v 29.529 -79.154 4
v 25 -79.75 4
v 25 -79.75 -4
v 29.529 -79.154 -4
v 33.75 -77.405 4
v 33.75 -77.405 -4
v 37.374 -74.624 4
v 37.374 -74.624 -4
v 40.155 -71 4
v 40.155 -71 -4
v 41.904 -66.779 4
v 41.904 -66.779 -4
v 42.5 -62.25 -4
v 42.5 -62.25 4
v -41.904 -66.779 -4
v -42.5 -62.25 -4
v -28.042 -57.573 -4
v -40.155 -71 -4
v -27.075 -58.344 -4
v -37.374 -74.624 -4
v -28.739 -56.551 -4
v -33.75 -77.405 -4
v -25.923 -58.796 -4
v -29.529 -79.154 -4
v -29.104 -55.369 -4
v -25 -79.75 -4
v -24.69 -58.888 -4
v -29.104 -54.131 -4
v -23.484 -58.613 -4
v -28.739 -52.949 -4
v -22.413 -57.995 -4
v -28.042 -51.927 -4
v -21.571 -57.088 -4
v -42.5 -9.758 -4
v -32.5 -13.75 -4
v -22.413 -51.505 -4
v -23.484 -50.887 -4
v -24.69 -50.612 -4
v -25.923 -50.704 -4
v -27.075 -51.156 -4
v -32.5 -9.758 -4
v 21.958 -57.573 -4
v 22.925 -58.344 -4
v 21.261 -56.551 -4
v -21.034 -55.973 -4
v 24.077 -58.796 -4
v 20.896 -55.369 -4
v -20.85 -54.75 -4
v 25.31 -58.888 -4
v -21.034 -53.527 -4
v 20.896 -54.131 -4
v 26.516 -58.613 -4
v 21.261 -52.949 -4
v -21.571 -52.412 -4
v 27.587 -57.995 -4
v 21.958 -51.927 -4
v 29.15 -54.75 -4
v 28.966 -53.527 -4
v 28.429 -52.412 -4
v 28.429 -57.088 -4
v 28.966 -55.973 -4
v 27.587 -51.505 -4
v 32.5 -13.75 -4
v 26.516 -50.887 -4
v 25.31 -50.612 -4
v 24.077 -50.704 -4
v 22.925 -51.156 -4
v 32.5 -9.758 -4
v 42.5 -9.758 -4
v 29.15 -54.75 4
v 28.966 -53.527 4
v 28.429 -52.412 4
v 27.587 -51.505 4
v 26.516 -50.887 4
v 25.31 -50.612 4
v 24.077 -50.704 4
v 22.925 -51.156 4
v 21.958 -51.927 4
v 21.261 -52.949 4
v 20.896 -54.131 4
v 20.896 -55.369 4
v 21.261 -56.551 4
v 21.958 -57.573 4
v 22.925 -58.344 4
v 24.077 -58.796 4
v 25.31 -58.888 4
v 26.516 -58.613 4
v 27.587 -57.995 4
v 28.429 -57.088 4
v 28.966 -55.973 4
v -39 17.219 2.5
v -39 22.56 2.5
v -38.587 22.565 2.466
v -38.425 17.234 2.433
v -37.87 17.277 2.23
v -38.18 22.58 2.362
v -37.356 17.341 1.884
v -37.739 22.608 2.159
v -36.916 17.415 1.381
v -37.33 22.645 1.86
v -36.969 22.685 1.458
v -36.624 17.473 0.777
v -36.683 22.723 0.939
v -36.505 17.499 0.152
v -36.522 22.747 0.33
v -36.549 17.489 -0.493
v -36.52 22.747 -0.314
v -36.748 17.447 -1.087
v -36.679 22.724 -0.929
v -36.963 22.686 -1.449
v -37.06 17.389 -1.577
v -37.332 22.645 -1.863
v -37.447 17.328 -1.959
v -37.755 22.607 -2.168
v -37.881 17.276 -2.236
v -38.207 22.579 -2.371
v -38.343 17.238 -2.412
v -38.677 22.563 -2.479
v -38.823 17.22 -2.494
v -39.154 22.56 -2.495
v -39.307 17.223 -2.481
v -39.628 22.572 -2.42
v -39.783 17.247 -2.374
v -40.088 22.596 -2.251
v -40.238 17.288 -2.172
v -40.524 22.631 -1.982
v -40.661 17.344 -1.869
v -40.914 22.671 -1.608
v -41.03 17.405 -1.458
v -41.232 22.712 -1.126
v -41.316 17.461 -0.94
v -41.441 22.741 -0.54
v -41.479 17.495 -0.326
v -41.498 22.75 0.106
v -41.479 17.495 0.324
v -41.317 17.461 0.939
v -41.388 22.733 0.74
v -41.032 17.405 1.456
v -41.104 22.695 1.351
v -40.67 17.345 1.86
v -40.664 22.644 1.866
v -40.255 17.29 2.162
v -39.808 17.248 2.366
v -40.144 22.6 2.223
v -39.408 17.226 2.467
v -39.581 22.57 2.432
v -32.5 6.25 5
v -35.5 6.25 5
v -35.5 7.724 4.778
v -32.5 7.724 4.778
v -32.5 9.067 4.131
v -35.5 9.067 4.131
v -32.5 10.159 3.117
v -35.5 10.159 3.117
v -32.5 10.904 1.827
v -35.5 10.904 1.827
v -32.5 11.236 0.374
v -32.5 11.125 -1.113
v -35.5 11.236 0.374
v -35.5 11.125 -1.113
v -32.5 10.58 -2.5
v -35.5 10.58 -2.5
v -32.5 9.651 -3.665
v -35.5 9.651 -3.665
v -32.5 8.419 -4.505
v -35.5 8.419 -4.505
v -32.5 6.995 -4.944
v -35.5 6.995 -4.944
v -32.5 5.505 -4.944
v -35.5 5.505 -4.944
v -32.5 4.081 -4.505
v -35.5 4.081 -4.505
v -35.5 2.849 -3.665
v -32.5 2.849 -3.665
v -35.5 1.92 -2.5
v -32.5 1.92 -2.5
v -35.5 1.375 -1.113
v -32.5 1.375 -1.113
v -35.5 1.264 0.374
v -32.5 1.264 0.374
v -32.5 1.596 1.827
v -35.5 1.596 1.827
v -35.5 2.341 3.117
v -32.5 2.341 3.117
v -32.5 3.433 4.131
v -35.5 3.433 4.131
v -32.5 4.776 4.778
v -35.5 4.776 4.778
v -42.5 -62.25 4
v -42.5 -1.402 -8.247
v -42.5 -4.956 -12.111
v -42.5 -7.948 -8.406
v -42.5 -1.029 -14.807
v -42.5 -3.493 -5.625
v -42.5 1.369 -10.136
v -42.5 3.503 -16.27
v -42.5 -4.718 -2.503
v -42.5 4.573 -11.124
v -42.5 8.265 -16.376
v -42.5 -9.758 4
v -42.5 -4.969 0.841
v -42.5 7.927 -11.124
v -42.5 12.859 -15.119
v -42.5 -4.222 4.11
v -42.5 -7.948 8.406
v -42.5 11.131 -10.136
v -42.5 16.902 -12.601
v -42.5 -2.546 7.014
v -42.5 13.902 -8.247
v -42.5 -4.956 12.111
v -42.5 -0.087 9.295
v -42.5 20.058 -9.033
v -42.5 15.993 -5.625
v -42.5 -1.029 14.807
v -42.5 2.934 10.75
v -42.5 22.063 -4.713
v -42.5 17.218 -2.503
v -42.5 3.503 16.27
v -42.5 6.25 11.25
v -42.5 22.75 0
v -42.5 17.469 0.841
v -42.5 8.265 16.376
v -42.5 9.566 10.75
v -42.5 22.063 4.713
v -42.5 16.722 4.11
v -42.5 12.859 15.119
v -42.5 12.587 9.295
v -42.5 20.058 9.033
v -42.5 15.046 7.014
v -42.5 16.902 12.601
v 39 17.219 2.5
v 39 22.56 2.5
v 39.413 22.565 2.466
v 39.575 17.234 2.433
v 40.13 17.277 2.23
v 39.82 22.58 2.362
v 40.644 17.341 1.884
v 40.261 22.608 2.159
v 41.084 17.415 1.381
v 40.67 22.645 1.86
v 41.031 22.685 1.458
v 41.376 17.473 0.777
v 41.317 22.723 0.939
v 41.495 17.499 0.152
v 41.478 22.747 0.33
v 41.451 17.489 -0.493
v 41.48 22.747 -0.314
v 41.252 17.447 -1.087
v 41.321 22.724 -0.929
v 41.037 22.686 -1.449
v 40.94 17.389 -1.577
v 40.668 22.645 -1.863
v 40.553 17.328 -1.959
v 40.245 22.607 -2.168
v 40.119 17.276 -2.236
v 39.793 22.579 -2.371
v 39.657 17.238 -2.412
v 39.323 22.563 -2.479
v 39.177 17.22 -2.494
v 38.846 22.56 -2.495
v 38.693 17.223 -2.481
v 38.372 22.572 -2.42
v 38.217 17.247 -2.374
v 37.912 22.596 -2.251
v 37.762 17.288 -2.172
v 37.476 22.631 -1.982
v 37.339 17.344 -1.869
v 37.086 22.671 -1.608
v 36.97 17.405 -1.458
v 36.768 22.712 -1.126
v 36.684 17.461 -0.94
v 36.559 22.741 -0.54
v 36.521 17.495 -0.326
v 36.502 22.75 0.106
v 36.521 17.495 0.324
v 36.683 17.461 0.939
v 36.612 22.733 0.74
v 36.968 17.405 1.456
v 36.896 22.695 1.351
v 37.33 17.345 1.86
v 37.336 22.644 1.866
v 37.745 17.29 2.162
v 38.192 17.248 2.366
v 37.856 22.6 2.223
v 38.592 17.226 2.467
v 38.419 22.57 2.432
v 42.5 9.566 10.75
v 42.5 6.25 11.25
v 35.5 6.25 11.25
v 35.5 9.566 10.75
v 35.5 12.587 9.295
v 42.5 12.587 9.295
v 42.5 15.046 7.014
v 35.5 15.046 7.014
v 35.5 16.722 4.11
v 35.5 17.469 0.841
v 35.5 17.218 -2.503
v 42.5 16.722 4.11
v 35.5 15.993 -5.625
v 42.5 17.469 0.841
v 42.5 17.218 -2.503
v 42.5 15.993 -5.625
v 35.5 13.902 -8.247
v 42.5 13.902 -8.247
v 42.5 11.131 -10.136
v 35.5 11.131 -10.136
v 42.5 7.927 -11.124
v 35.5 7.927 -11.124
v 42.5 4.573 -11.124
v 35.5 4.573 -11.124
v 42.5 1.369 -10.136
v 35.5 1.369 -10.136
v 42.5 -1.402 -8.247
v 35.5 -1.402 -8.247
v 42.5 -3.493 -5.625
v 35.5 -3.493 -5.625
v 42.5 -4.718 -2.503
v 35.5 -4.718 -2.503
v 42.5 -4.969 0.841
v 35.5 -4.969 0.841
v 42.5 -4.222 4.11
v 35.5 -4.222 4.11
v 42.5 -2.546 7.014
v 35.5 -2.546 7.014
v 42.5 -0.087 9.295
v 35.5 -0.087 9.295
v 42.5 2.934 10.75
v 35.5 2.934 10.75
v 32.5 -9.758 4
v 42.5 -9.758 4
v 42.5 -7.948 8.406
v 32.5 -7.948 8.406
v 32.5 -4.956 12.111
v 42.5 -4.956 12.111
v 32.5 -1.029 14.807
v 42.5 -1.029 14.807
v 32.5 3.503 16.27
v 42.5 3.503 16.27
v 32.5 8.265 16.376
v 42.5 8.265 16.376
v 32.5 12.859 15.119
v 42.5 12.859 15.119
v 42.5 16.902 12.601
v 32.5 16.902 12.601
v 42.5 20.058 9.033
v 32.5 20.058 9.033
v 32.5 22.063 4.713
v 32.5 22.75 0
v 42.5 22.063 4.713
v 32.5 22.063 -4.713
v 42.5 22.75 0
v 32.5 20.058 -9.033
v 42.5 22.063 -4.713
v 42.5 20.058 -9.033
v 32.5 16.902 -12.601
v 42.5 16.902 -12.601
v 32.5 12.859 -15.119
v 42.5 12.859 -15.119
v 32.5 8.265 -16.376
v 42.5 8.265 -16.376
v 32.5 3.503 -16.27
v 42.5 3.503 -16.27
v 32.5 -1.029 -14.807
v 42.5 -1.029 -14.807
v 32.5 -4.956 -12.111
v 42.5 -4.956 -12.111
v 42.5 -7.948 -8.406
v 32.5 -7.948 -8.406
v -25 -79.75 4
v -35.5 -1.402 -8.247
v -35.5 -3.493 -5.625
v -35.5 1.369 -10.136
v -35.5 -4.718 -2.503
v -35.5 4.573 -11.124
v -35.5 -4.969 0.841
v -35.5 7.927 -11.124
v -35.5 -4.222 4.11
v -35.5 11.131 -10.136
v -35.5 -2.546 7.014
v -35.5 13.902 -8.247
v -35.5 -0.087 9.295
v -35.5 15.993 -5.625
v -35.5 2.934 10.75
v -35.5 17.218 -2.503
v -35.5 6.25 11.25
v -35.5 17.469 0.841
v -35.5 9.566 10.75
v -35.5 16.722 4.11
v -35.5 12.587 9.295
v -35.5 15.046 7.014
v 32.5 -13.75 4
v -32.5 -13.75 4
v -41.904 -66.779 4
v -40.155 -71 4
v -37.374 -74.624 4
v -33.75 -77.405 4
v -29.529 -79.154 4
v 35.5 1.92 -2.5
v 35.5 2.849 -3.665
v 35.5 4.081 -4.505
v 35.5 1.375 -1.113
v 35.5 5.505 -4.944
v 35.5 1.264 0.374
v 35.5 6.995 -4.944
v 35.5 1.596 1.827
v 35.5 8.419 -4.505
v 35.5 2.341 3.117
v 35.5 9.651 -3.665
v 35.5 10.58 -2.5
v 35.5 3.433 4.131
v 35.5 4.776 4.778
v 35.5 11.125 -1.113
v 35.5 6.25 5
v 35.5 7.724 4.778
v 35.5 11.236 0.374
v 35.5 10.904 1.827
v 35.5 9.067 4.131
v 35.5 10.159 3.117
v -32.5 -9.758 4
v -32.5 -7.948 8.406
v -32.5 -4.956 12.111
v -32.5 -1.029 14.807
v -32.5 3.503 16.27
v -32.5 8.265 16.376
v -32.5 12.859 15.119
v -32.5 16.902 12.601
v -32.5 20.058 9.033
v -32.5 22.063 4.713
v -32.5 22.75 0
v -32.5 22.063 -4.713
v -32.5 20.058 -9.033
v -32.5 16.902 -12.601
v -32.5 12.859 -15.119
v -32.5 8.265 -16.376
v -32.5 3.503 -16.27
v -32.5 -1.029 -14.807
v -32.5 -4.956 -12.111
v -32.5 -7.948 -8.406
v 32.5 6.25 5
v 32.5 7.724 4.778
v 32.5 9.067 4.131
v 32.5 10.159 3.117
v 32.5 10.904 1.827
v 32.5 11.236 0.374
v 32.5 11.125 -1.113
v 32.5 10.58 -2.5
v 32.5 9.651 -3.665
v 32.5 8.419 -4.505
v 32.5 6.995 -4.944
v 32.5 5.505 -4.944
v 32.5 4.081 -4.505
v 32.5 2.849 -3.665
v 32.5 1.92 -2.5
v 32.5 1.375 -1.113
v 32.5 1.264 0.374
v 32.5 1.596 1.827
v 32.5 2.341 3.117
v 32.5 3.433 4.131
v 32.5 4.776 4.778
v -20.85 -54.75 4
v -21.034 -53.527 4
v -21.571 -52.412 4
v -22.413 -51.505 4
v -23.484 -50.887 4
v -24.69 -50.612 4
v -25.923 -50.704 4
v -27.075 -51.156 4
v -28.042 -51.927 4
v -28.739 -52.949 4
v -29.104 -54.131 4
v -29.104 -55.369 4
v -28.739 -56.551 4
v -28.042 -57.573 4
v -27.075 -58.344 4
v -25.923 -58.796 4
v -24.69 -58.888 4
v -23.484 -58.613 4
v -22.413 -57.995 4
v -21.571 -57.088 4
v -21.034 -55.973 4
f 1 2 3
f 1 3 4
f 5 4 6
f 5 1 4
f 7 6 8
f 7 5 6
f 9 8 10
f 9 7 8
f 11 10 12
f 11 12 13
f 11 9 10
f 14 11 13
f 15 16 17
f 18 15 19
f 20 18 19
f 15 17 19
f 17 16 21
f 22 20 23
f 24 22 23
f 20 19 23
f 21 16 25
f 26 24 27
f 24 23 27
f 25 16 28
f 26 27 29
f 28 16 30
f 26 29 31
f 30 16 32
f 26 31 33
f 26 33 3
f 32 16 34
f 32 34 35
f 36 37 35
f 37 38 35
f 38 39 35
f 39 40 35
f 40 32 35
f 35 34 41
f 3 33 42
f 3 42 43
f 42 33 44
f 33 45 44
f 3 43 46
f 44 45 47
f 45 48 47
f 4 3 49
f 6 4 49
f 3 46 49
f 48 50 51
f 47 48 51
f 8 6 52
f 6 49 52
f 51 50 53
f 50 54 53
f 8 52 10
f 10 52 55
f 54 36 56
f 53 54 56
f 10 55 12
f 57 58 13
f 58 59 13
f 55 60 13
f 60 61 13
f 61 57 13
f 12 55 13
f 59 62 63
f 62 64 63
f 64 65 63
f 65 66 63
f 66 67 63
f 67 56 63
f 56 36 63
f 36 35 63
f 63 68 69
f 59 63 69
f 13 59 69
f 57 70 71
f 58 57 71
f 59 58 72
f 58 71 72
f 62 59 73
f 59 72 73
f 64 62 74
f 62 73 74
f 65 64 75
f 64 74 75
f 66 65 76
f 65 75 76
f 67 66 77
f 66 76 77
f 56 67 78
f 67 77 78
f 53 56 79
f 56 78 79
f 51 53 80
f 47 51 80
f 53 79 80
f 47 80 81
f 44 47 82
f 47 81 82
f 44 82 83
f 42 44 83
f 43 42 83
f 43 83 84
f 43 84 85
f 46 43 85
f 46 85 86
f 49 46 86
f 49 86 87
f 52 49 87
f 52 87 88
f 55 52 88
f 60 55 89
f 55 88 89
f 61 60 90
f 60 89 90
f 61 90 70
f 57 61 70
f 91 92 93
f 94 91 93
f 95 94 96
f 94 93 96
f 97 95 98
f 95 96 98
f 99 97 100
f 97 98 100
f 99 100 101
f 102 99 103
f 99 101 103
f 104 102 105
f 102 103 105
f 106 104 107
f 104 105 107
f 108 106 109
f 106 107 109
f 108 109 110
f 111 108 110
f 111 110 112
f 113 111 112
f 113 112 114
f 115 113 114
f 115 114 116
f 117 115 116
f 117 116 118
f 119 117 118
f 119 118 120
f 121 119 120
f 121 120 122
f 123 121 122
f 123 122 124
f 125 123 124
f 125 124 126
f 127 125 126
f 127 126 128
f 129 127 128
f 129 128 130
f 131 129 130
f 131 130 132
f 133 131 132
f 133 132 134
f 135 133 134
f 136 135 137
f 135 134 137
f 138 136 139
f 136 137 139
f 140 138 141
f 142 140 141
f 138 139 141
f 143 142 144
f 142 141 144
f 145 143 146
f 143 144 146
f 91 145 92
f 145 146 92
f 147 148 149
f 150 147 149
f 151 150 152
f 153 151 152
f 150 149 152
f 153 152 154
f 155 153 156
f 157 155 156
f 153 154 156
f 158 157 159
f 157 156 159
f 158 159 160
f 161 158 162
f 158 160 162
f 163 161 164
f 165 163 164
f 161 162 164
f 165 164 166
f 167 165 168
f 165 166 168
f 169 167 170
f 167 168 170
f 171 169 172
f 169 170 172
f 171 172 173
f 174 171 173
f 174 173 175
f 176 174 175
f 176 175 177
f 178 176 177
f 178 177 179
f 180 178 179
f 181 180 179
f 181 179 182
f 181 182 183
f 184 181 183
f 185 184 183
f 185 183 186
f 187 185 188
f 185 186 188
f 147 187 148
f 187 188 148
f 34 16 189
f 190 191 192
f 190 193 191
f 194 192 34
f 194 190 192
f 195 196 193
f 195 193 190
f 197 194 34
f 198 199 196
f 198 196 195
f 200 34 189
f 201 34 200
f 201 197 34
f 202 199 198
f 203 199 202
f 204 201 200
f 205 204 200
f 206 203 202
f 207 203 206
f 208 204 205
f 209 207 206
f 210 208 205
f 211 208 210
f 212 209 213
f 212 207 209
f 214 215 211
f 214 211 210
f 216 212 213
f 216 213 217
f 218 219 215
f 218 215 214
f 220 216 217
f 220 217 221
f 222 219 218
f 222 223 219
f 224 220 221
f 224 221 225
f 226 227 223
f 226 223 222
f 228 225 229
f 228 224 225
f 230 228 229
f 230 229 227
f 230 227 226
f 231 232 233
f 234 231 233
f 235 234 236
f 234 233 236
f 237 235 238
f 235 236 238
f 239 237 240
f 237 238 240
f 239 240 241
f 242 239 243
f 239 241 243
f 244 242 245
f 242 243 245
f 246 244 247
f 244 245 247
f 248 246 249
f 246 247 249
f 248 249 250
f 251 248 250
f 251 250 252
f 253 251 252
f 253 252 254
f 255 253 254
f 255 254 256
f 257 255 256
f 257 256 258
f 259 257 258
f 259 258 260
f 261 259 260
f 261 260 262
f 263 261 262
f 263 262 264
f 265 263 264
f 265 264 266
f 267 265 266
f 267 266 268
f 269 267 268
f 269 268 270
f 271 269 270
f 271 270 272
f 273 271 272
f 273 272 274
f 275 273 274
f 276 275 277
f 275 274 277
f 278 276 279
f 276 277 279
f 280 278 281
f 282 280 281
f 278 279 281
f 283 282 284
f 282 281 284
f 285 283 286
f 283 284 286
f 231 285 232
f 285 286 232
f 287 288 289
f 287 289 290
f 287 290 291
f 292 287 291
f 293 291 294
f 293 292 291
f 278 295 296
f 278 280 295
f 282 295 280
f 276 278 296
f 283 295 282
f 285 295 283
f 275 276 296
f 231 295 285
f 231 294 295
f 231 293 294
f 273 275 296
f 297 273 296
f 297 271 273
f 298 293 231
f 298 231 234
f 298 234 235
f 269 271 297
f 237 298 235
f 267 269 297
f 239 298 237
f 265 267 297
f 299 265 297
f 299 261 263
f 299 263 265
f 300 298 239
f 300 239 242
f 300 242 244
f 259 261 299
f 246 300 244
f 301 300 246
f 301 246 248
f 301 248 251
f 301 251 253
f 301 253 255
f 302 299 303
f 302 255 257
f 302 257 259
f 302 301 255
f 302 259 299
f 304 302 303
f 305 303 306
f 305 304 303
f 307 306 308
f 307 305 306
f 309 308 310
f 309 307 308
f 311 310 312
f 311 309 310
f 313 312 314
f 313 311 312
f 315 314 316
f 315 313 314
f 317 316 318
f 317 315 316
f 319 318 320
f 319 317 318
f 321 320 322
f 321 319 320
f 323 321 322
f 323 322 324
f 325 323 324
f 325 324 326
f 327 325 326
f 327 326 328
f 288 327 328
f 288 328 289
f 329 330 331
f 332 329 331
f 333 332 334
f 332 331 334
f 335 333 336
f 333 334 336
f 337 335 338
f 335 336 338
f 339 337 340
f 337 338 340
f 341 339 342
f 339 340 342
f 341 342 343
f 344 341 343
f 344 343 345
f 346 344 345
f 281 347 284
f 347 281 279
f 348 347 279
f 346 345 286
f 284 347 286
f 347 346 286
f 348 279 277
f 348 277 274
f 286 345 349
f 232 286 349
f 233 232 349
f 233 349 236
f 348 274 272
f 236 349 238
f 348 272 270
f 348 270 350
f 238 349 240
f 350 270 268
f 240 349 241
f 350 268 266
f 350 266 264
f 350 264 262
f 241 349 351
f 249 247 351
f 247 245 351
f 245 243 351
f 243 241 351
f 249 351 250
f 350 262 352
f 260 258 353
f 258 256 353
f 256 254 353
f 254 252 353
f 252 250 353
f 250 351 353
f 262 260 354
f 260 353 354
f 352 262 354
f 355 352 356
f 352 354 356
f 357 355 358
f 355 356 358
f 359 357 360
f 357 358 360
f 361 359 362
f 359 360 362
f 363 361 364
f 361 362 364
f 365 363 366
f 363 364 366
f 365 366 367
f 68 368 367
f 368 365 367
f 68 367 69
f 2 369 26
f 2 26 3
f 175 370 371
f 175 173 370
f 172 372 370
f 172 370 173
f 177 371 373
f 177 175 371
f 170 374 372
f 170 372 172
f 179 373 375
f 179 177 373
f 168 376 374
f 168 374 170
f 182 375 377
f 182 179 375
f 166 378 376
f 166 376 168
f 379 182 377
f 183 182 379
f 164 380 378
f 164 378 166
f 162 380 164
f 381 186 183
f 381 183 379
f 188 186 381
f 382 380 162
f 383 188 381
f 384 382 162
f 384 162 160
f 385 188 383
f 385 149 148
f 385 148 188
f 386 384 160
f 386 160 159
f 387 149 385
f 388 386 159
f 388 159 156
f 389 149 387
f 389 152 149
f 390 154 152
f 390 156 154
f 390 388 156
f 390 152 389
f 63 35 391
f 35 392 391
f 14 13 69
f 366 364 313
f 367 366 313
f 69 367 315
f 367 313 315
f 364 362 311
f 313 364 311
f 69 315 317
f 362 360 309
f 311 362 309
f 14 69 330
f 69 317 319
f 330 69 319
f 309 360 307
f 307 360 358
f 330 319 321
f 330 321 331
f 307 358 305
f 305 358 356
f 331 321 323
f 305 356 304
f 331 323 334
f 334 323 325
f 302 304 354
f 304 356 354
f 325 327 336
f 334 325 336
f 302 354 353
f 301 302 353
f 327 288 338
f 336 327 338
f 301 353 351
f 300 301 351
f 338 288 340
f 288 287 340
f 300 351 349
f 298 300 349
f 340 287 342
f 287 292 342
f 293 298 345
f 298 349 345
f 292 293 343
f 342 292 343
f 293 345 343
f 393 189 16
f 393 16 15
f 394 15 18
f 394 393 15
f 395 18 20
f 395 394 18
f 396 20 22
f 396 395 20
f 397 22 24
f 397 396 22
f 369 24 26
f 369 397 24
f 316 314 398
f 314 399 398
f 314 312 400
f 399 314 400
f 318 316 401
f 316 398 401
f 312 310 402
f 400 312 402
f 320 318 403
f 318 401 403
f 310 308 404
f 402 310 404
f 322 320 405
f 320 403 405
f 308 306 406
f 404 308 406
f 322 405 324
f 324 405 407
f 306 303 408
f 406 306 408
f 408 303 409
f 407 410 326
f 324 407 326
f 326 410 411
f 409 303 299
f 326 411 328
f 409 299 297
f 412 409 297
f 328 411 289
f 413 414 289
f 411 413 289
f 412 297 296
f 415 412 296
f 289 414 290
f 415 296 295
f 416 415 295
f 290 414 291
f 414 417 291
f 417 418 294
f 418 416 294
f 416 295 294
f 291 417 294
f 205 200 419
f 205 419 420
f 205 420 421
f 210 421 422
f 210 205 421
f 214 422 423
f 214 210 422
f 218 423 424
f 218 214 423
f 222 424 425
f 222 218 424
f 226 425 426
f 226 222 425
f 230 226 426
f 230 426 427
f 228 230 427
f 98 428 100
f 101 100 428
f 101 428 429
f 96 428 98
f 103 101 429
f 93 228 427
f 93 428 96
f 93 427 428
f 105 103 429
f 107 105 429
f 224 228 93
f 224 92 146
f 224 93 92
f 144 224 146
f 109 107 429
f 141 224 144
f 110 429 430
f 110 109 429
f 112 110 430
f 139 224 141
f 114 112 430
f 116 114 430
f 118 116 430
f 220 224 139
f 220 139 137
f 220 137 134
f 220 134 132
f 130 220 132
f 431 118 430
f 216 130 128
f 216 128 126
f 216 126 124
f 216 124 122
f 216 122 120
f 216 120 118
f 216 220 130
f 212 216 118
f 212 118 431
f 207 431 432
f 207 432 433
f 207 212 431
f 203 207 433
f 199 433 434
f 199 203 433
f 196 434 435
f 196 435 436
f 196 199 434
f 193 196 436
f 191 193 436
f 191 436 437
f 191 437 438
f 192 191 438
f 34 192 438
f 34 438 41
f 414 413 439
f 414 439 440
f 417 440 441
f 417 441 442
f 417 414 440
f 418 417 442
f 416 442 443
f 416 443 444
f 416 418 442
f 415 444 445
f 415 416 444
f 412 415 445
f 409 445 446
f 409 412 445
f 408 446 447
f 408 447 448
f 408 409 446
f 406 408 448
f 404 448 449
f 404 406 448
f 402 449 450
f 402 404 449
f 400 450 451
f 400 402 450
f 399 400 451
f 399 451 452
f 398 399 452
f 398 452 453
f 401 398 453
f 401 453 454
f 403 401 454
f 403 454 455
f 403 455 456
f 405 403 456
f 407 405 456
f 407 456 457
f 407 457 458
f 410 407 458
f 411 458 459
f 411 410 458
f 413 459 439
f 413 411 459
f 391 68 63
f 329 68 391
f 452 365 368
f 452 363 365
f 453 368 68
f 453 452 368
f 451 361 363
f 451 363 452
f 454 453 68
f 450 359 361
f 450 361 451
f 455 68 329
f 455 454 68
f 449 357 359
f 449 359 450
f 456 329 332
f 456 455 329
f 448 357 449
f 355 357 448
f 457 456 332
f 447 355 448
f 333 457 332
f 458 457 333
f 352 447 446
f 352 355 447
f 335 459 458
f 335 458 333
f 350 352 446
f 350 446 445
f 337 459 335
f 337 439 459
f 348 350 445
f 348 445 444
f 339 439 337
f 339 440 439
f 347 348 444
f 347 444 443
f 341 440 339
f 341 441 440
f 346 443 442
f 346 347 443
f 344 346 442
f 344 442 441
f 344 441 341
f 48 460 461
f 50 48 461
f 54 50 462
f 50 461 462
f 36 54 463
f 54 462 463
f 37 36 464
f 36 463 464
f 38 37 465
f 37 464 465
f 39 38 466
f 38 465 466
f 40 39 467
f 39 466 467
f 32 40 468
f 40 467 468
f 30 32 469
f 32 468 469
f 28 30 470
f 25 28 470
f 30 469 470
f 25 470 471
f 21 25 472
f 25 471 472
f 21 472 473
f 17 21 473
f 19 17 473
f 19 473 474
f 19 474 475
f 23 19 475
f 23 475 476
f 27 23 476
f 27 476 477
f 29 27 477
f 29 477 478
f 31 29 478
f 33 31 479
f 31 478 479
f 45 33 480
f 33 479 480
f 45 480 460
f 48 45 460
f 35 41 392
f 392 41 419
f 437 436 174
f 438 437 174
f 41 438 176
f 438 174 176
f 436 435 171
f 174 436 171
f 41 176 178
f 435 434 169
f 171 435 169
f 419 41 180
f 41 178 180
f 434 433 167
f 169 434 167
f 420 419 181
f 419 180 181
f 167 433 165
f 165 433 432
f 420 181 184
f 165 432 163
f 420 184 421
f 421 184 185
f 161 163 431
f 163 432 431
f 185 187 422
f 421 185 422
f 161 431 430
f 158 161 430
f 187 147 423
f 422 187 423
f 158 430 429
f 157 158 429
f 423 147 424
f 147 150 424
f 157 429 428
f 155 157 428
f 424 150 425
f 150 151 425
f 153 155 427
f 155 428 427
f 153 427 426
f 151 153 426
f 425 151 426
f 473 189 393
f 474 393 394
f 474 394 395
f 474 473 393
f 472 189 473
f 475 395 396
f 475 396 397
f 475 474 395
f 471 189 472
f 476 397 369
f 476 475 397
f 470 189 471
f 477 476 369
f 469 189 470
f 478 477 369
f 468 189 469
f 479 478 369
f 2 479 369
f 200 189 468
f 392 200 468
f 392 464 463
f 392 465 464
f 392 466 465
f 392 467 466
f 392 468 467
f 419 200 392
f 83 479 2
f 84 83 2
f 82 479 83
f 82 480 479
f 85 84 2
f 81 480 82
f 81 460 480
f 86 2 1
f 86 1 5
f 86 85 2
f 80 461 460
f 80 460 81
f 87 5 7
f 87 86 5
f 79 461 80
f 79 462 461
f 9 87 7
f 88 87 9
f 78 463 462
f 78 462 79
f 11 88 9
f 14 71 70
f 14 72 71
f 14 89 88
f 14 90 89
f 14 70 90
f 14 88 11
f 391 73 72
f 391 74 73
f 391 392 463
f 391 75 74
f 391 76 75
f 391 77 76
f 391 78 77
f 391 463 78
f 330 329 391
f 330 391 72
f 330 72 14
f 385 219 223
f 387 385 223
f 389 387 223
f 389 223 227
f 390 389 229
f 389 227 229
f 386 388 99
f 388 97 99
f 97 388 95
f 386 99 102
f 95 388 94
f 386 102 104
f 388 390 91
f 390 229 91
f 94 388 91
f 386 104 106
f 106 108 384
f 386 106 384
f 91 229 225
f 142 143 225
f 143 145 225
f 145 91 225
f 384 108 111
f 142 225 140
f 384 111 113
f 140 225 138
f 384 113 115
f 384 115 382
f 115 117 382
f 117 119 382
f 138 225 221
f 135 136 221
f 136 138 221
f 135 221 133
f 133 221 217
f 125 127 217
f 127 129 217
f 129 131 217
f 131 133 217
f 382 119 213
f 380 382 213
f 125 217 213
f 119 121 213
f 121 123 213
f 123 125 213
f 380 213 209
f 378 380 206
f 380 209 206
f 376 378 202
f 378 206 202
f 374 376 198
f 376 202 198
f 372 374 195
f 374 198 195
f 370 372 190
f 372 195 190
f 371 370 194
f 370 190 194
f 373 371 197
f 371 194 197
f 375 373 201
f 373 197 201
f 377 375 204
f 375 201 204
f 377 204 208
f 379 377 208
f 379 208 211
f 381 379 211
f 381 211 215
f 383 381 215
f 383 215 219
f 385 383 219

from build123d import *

# Parameters (mm, degrees)
BOSS_EXTRUDE1_DEPTH = 4
SKETCH7_R           = 4.15
BOSS_EXTRUDE3_DEPTH = 8
SKETCH8_R           = 16.5
BOSS_EXTRUDE4_DEPTH = 10
SKETCH9_R           = 11.25
CUT_EXTRUDE1_DEPTH  = 7
SKETCH10_R          = 5
CUT_EXTRUDE2_DEPTH  = 3
SKETCH11_R          = 2.5
CUT_EXTRUDE3_DEPTH  = 10


with BuildPart() as part:
    # Sketch2 → Boss-Extrude1 (new, symmetric)
    with BuildSketch(Plane.XY):
        Polygon((-42.5, 13.75), (-32.5, 13.75), (-32.5, -13.75), (32.5, -13.75), (32.5, 13.75), (42.5, 13.75), (42.5, -23.75), (-42.5, -23.75), align=None)
    extrude(amount=BOSS_EXTRUDE1_DEPTH, both=True)

    # Sketch7 → Boss-Extrude3 (add)
    with BuildSketch(Plane.XY.offset(4)):
        with BuildLine():
            Line((-42.5, -23.75), (-42.5, -62.25))
            ThreePointArc((-42.5, -62.25), (-37.374368671, -74.624368671), (-25, -79.75))
            Line((-25, -79.75), (25, -79.75))
            ThreePointArc((25, -79.75), (37.374368671, -74.624368671), (42.5, -62.25))
            Line((42.5, -62.25), (42.5, -23.75))
            Line((42.5, -23.75), (-42.5, -23.75))
        make_face()
        with Locations((-25, -54.75)):
            Circle(SKETCH7_R, mode=Mode.SUBTRACT)
        with Locations((25, -54.75)):
            Circle(SKETCH7_R, mode=Mode.SUBTRACT)
    extrude(amount=-BOSS_EXTRUDE3_DEPTH)

    # Sketch8 → Boss-Extrude4 (add)
    with BuildSketch(Plane.ZY.offset(42.5)):
        with Locations((0, 6.25)):
            Circle(SKETCH8_R)
    boss_extrude4 = extrude(amount=-BOSS_EXTRUDE4_DEPTH)

    # Sketch9 → Cut-Extrude1 (cut)
    with BuildSketch(Plane.ZY.offset(42.5)):
        with Locations((0, 6.25)):
            Circle(SKETCH9_R)
    cut_extrude1 = extrude(amount=-CUT_EXTRUDE1_DEPTH, mode=Mode.SUBTRACT)

    # Sketch10 → Cut-Extrude2 (cut)
    with BuildSketch(Plane.ZY.offset(35.5)):
        with Locations((0, 6.25)):
            Circle(SKETCH10_R)
    cut_extrude2 = extrude(amount=-CUT_EXTRUDE2_DEPTH, mode=Mode.SUBTRACT)

    # Mirror1: Boss-Extrude4, Cut-Extrude1, Cut-Extrude2 across plane
    add(boss_extrude4.mirror(Plane(origin=(0, 0, 0), x_dir=(0, 0, 1), z_dir=(1, 0, 0))))
    add(cut_extrude1.mirror(Plane(origin=(0, 0, 0), x_dir=(0, 0, 1), z_dir=(1, 0, 0))), mode=Mode.SUBTRACT)
    add(cut_extrude2.mirror(Plane(origin=(0, 0, 0), x_dir=(0, 0, 1), z_dir=(1, 0, 0))), mode=Mode.SUBTRACT)

    # Sketch11 → Cut-Extrude3 (cut)
    with BuildSketch(Plane(origin=(0, 22.75, 0), x_dir=(1, 0, 0), z_dir=(0, 1, 0))):
        with Locations(Location((-39, 0, 0), (0, 0, 270))):
            Circle(SKETCH11_R)
        with Locations(Location((39, 0, 0), (0, 0, 270))):
            Circle(SKETCH11_R)
    extrude(amount=-CUT_EXTRUDE3_DEPTH, mode=Mode.SUBTRACT)


solid = part.part
